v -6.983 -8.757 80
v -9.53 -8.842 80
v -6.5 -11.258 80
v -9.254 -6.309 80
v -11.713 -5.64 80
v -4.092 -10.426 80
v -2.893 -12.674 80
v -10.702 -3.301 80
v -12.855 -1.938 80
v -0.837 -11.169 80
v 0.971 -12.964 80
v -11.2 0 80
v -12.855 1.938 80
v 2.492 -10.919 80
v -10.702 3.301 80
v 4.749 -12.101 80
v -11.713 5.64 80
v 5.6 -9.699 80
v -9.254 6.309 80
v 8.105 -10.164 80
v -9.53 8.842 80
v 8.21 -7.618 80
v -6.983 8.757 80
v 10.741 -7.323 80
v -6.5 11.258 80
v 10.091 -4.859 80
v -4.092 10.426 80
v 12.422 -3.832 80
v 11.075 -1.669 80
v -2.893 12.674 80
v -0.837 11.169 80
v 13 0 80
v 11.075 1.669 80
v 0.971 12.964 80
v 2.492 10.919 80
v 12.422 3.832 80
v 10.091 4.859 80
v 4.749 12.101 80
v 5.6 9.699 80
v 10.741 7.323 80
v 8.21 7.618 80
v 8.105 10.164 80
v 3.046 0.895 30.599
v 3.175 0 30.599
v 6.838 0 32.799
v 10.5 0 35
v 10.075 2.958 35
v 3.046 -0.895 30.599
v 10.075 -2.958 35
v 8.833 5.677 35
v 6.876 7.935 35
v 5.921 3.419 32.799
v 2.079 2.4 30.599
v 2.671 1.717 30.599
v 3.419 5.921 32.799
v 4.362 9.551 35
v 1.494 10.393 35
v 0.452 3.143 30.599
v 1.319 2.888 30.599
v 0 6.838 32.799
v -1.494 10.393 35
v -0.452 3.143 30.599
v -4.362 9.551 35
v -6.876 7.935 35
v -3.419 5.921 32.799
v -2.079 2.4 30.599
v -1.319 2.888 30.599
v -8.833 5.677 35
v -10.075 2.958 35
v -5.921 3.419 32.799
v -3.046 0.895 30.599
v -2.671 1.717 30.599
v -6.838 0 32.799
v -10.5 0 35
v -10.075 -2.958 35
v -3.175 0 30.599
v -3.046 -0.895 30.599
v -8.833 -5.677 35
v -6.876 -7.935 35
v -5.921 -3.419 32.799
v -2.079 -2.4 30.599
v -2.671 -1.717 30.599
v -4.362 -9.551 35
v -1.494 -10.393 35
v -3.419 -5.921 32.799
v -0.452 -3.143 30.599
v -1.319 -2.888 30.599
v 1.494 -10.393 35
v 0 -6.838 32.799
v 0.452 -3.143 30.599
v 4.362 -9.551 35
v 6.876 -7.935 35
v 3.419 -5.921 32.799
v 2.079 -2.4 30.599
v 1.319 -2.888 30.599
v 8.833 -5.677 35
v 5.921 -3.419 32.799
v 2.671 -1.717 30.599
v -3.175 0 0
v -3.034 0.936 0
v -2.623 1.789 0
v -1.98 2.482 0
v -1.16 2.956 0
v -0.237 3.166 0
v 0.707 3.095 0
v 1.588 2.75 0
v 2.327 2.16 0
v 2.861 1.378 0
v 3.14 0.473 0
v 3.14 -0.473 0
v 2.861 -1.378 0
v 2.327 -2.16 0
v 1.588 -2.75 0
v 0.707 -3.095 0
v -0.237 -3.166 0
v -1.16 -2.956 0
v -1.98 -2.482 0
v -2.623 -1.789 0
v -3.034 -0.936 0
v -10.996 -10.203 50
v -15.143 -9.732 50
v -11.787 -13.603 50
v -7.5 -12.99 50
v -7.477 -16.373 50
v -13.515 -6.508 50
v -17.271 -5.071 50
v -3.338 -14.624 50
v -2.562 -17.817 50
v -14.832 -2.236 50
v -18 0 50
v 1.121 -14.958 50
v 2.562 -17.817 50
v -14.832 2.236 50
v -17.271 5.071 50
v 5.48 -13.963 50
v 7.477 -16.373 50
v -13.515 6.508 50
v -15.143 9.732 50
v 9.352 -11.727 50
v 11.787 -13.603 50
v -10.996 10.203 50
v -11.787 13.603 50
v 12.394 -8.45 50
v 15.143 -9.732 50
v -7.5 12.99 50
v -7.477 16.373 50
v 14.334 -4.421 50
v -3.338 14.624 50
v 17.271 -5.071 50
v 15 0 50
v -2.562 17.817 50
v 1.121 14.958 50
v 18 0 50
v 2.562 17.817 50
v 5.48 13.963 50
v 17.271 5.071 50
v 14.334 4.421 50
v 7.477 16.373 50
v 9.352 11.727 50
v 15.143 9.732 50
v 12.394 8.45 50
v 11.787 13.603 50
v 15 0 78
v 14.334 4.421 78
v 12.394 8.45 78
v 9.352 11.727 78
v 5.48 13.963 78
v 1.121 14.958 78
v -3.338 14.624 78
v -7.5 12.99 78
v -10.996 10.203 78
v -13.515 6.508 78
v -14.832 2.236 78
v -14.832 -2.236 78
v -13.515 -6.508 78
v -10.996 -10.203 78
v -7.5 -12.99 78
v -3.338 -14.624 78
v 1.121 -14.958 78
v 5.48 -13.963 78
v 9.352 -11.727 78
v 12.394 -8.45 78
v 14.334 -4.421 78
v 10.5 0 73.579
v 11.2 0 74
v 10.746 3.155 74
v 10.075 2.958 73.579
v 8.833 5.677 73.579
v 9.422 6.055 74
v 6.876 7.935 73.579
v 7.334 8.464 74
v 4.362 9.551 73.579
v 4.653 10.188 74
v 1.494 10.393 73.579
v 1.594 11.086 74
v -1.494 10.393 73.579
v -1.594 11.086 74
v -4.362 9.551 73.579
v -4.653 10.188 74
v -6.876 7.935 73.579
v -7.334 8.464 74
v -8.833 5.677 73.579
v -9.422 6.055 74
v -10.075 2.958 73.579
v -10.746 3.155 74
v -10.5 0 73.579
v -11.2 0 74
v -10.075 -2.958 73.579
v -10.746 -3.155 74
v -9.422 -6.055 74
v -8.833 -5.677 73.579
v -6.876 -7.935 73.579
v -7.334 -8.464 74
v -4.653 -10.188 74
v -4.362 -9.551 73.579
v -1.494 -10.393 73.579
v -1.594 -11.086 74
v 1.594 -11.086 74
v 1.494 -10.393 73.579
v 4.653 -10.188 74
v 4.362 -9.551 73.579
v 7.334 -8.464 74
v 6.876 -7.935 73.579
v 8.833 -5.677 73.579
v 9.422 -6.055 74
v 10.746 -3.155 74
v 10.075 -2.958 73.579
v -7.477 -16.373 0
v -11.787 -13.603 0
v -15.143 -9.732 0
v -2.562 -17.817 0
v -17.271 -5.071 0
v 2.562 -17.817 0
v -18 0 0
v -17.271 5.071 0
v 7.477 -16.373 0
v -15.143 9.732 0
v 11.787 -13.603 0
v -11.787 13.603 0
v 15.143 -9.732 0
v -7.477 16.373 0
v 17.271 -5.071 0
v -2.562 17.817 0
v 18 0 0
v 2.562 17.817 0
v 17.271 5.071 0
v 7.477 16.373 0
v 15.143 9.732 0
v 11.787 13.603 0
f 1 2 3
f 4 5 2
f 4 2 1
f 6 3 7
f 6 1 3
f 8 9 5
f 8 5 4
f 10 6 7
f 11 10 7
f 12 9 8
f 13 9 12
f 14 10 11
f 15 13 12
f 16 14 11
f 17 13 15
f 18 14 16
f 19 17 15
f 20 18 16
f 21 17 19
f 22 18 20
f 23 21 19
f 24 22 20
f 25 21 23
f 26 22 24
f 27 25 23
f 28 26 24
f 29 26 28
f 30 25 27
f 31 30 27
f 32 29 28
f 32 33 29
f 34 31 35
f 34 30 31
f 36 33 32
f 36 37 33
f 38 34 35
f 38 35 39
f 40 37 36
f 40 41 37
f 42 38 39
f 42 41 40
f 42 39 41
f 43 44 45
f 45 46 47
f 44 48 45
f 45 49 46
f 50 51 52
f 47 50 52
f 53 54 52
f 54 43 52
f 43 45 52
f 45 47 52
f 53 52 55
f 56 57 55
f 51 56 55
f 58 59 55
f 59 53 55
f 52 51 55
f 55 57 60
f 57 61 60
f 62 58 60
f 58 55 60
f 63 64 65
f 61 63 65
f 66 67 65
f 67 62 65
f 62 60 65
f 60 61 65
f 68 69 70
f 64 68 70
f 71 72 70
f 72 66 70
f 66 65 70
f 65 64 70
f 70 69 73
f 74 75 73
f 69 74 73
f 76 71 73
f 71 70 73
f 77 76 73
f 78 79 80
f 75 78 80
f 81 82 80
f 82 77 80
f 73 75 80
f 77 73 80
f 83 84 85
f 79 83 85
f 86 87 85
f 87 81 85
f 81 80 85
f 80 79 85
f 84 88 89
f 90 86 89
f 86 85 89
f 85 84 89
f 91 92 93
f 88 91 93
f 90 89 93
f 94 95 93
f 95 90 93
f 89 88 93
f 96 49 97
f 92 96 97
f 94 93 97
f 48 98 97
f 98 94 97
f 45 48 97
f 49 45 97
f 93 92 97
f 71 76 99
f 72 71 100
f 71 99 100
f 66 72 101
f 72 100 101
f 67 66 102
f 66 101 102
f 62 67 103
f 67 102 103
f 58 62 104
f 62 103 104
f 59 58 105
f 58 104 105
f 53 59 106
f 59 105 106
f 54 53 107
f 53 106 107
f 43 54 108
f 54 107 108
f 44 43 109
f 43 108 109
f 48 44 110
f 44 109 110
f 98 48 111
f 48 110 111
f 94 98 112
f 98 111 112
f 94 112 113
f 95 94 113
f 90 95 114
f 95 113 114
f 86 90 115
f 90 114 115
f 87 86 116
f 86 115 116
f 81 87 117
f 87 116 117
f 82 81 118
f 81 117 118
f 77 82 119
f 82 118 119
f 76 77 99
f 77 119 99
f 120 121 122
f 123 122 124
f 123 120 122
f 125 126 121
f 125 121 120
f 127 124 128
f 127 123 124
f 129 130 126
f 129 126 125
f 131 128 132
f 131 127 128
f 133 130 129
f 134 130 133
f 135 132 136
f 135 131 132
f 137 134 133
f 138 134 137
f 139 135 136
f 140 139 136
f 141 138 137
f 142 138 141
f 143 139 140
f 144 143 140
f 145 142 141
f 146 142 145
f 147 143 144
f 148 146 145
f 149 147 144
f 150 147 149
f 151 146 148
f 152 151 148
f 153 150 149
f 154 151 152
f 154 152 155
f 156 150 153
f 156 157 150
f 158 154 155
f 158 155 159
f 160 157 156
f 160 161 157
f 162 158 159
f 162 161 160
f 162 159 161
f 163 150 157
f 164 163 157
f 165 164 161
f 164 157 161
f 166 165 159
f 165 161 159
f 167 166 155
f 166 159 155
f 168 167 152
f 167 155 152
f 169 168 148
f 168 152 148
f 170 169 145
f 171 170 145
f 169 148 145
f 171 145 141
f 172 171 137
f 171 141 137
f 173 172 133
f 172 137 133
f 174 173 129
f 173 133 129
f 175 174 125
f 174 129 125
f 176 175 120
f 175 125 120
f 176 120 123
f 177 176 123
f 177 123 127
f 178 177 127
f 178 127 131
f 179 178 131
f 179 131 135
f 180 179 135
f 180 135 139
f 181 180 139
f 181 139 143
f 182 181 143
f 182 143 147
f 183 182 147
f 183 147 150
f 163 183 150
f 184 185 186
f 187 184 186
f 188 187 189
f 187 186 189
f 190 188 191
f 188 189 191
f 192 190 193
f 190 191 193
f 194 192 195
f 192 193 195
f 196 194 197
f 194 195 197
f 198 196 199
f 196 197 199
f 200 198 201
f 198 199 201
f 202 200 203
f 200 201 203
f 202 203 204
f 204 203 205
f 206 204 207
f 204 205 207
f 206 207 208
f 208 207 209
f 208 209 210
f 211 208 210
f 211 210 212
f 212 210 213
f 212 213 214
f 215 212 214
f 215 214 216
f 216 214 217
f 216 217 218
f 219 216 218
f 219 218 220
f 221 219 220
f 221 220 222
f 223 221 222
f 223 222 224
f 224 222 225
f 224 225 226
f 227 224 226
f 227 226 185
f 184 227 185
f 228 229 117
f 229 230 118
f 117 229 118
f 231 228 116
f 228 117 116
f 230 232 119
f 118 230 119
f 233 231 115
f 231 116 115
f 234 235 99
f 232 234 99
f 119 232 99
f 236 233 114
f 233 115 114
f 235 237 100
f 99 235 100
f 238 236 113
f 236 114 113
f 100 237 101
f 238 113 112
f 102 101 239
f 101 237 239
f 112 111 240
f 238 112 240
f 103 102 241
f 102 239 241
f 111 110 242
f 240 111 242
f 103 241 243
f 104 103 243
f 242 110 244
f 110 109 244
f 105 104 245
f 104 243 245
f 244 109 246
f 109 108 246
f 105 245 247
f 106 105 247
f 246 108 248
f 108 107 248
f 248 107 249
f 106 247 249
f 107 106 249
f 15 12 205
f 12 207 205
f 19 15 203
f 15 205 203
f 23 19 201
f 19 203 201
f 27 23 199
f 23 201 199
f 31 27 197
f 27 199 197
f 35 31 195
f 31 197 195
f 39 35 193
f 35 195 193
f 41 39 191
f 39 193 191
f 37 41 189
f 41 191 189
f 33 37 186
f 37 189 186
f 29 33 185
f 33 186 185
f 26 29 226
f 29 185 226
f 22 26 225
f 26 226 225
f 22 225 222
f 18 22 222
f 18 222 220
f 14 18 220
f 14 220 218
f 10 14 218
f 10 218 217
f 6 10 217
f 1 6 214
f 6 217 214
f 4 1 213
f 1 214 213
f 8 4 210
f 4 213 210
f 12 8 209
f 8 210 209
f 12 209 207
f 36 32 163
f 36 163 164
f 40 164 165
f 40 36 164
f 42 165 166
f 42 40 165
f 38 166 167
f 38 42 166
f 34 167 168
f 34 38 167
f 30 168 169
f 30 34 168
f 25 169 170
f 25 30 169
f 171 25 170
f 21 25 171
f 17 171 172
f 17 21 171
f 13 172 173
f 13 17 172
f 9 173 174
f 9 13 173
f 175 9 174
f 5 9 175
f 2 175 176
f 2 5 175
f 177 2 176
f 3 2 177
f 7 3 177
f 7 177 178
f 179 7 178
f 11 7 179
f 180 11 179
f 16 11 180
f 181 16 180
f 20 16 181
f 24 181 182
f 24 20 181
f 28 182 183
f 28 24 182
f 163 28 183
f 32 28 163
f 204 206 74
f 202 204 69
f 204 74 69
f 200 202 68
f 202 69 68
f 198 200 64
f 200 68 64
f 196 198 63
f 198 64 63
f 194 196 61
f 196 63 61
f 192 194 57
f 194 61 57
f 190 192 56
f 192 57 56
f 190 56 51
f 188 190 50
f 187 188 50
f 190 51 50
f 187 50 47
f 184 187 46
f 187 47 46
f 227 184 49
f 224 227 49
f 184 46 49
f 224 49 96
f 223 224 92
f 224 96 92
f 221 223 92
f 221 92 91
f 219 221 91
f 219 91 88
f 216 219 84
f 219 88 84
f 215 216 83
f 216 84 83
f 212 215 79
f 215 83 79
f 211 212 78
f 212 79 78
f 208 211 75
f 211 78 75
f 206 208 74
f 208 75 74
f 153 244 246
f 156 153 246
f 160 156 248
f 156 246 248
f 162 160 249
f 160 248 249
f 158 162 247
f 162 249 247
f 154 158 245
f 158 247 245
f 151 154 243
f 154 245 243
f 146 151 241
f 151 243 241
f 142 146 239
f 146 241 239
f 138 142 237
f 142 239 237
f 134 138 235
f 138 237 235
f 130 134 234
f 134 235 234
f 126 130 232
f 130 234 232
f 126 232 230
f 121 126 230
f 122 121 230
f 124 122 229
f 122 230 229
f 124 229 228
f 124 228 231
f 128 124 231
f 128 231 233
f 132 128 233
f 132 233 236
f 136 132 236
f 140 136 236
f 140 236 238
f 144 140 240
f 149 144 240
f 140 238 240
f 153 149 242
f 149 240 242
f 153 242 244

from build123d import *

# Parameters (mm, degrees)
F0_R      = 15
F1_DEPTH  = 80
F2_R      = 18
F3_DEPTH  = 50
F6_D      = 6.35
F8_D      = 21
F8_DEPTH  = 45
F8_TIP    = 6.3090364998
F10_D     = 22.4
F10_DEPTH = 6
F10_TIP   = 6.7296389331
F11_SIZE  = 2


with BuildPart() as f1:
    # F0 (on Top) → F1 (new body)
    with BuildSketch(Plane.XY):
        Circle(F0_R)
    extrude(amount=F1_DEPTH)

    # F2 (on Top) → F3 (join)
    with BuildSketch(Plane.XY):
        Circle(F2_R)
    extrude(amount=F3_DEPTH)

    # F6 (through all)
    with Locations(Plane.XY.offset(80)):
        with Locations((0, 0)):
            Hole(F6_D / 2)

    # F8
    with Locations(Plane.XY.offset(80)):
        with Locations((0, 0)):
            Hole(F8_D / 2, depth=F8_DEPTH)
            with Locations((0, 0, -(F8_DEPTH + F8_TIP / 2))):  # 118° drill point
                Cone(0, F8_D / 2, F8_TIP, mode=Mode.SUBTRACT)

    # F10
    with Locations(Plane.XY.offset(80)):
        with Locations((0, 0)):
            Hole(F10_D / 2, depth=F10_DEPTH)
            with Locations((0, 0, -(F10_DEPTH + F10_TIP / 2))):  # 118° drill point
                Cone(0, F10_D / 2, F10_TIP, mode=Mode.SUBTRACT)

    # F11
    f11_edges = [f1.edges().sort_by_distance(p)[0] for p in [
        (-15, 0, 80),
    ]]
    chamfer(f11_edges, length=F11_SIZE)


solid = f1.part
